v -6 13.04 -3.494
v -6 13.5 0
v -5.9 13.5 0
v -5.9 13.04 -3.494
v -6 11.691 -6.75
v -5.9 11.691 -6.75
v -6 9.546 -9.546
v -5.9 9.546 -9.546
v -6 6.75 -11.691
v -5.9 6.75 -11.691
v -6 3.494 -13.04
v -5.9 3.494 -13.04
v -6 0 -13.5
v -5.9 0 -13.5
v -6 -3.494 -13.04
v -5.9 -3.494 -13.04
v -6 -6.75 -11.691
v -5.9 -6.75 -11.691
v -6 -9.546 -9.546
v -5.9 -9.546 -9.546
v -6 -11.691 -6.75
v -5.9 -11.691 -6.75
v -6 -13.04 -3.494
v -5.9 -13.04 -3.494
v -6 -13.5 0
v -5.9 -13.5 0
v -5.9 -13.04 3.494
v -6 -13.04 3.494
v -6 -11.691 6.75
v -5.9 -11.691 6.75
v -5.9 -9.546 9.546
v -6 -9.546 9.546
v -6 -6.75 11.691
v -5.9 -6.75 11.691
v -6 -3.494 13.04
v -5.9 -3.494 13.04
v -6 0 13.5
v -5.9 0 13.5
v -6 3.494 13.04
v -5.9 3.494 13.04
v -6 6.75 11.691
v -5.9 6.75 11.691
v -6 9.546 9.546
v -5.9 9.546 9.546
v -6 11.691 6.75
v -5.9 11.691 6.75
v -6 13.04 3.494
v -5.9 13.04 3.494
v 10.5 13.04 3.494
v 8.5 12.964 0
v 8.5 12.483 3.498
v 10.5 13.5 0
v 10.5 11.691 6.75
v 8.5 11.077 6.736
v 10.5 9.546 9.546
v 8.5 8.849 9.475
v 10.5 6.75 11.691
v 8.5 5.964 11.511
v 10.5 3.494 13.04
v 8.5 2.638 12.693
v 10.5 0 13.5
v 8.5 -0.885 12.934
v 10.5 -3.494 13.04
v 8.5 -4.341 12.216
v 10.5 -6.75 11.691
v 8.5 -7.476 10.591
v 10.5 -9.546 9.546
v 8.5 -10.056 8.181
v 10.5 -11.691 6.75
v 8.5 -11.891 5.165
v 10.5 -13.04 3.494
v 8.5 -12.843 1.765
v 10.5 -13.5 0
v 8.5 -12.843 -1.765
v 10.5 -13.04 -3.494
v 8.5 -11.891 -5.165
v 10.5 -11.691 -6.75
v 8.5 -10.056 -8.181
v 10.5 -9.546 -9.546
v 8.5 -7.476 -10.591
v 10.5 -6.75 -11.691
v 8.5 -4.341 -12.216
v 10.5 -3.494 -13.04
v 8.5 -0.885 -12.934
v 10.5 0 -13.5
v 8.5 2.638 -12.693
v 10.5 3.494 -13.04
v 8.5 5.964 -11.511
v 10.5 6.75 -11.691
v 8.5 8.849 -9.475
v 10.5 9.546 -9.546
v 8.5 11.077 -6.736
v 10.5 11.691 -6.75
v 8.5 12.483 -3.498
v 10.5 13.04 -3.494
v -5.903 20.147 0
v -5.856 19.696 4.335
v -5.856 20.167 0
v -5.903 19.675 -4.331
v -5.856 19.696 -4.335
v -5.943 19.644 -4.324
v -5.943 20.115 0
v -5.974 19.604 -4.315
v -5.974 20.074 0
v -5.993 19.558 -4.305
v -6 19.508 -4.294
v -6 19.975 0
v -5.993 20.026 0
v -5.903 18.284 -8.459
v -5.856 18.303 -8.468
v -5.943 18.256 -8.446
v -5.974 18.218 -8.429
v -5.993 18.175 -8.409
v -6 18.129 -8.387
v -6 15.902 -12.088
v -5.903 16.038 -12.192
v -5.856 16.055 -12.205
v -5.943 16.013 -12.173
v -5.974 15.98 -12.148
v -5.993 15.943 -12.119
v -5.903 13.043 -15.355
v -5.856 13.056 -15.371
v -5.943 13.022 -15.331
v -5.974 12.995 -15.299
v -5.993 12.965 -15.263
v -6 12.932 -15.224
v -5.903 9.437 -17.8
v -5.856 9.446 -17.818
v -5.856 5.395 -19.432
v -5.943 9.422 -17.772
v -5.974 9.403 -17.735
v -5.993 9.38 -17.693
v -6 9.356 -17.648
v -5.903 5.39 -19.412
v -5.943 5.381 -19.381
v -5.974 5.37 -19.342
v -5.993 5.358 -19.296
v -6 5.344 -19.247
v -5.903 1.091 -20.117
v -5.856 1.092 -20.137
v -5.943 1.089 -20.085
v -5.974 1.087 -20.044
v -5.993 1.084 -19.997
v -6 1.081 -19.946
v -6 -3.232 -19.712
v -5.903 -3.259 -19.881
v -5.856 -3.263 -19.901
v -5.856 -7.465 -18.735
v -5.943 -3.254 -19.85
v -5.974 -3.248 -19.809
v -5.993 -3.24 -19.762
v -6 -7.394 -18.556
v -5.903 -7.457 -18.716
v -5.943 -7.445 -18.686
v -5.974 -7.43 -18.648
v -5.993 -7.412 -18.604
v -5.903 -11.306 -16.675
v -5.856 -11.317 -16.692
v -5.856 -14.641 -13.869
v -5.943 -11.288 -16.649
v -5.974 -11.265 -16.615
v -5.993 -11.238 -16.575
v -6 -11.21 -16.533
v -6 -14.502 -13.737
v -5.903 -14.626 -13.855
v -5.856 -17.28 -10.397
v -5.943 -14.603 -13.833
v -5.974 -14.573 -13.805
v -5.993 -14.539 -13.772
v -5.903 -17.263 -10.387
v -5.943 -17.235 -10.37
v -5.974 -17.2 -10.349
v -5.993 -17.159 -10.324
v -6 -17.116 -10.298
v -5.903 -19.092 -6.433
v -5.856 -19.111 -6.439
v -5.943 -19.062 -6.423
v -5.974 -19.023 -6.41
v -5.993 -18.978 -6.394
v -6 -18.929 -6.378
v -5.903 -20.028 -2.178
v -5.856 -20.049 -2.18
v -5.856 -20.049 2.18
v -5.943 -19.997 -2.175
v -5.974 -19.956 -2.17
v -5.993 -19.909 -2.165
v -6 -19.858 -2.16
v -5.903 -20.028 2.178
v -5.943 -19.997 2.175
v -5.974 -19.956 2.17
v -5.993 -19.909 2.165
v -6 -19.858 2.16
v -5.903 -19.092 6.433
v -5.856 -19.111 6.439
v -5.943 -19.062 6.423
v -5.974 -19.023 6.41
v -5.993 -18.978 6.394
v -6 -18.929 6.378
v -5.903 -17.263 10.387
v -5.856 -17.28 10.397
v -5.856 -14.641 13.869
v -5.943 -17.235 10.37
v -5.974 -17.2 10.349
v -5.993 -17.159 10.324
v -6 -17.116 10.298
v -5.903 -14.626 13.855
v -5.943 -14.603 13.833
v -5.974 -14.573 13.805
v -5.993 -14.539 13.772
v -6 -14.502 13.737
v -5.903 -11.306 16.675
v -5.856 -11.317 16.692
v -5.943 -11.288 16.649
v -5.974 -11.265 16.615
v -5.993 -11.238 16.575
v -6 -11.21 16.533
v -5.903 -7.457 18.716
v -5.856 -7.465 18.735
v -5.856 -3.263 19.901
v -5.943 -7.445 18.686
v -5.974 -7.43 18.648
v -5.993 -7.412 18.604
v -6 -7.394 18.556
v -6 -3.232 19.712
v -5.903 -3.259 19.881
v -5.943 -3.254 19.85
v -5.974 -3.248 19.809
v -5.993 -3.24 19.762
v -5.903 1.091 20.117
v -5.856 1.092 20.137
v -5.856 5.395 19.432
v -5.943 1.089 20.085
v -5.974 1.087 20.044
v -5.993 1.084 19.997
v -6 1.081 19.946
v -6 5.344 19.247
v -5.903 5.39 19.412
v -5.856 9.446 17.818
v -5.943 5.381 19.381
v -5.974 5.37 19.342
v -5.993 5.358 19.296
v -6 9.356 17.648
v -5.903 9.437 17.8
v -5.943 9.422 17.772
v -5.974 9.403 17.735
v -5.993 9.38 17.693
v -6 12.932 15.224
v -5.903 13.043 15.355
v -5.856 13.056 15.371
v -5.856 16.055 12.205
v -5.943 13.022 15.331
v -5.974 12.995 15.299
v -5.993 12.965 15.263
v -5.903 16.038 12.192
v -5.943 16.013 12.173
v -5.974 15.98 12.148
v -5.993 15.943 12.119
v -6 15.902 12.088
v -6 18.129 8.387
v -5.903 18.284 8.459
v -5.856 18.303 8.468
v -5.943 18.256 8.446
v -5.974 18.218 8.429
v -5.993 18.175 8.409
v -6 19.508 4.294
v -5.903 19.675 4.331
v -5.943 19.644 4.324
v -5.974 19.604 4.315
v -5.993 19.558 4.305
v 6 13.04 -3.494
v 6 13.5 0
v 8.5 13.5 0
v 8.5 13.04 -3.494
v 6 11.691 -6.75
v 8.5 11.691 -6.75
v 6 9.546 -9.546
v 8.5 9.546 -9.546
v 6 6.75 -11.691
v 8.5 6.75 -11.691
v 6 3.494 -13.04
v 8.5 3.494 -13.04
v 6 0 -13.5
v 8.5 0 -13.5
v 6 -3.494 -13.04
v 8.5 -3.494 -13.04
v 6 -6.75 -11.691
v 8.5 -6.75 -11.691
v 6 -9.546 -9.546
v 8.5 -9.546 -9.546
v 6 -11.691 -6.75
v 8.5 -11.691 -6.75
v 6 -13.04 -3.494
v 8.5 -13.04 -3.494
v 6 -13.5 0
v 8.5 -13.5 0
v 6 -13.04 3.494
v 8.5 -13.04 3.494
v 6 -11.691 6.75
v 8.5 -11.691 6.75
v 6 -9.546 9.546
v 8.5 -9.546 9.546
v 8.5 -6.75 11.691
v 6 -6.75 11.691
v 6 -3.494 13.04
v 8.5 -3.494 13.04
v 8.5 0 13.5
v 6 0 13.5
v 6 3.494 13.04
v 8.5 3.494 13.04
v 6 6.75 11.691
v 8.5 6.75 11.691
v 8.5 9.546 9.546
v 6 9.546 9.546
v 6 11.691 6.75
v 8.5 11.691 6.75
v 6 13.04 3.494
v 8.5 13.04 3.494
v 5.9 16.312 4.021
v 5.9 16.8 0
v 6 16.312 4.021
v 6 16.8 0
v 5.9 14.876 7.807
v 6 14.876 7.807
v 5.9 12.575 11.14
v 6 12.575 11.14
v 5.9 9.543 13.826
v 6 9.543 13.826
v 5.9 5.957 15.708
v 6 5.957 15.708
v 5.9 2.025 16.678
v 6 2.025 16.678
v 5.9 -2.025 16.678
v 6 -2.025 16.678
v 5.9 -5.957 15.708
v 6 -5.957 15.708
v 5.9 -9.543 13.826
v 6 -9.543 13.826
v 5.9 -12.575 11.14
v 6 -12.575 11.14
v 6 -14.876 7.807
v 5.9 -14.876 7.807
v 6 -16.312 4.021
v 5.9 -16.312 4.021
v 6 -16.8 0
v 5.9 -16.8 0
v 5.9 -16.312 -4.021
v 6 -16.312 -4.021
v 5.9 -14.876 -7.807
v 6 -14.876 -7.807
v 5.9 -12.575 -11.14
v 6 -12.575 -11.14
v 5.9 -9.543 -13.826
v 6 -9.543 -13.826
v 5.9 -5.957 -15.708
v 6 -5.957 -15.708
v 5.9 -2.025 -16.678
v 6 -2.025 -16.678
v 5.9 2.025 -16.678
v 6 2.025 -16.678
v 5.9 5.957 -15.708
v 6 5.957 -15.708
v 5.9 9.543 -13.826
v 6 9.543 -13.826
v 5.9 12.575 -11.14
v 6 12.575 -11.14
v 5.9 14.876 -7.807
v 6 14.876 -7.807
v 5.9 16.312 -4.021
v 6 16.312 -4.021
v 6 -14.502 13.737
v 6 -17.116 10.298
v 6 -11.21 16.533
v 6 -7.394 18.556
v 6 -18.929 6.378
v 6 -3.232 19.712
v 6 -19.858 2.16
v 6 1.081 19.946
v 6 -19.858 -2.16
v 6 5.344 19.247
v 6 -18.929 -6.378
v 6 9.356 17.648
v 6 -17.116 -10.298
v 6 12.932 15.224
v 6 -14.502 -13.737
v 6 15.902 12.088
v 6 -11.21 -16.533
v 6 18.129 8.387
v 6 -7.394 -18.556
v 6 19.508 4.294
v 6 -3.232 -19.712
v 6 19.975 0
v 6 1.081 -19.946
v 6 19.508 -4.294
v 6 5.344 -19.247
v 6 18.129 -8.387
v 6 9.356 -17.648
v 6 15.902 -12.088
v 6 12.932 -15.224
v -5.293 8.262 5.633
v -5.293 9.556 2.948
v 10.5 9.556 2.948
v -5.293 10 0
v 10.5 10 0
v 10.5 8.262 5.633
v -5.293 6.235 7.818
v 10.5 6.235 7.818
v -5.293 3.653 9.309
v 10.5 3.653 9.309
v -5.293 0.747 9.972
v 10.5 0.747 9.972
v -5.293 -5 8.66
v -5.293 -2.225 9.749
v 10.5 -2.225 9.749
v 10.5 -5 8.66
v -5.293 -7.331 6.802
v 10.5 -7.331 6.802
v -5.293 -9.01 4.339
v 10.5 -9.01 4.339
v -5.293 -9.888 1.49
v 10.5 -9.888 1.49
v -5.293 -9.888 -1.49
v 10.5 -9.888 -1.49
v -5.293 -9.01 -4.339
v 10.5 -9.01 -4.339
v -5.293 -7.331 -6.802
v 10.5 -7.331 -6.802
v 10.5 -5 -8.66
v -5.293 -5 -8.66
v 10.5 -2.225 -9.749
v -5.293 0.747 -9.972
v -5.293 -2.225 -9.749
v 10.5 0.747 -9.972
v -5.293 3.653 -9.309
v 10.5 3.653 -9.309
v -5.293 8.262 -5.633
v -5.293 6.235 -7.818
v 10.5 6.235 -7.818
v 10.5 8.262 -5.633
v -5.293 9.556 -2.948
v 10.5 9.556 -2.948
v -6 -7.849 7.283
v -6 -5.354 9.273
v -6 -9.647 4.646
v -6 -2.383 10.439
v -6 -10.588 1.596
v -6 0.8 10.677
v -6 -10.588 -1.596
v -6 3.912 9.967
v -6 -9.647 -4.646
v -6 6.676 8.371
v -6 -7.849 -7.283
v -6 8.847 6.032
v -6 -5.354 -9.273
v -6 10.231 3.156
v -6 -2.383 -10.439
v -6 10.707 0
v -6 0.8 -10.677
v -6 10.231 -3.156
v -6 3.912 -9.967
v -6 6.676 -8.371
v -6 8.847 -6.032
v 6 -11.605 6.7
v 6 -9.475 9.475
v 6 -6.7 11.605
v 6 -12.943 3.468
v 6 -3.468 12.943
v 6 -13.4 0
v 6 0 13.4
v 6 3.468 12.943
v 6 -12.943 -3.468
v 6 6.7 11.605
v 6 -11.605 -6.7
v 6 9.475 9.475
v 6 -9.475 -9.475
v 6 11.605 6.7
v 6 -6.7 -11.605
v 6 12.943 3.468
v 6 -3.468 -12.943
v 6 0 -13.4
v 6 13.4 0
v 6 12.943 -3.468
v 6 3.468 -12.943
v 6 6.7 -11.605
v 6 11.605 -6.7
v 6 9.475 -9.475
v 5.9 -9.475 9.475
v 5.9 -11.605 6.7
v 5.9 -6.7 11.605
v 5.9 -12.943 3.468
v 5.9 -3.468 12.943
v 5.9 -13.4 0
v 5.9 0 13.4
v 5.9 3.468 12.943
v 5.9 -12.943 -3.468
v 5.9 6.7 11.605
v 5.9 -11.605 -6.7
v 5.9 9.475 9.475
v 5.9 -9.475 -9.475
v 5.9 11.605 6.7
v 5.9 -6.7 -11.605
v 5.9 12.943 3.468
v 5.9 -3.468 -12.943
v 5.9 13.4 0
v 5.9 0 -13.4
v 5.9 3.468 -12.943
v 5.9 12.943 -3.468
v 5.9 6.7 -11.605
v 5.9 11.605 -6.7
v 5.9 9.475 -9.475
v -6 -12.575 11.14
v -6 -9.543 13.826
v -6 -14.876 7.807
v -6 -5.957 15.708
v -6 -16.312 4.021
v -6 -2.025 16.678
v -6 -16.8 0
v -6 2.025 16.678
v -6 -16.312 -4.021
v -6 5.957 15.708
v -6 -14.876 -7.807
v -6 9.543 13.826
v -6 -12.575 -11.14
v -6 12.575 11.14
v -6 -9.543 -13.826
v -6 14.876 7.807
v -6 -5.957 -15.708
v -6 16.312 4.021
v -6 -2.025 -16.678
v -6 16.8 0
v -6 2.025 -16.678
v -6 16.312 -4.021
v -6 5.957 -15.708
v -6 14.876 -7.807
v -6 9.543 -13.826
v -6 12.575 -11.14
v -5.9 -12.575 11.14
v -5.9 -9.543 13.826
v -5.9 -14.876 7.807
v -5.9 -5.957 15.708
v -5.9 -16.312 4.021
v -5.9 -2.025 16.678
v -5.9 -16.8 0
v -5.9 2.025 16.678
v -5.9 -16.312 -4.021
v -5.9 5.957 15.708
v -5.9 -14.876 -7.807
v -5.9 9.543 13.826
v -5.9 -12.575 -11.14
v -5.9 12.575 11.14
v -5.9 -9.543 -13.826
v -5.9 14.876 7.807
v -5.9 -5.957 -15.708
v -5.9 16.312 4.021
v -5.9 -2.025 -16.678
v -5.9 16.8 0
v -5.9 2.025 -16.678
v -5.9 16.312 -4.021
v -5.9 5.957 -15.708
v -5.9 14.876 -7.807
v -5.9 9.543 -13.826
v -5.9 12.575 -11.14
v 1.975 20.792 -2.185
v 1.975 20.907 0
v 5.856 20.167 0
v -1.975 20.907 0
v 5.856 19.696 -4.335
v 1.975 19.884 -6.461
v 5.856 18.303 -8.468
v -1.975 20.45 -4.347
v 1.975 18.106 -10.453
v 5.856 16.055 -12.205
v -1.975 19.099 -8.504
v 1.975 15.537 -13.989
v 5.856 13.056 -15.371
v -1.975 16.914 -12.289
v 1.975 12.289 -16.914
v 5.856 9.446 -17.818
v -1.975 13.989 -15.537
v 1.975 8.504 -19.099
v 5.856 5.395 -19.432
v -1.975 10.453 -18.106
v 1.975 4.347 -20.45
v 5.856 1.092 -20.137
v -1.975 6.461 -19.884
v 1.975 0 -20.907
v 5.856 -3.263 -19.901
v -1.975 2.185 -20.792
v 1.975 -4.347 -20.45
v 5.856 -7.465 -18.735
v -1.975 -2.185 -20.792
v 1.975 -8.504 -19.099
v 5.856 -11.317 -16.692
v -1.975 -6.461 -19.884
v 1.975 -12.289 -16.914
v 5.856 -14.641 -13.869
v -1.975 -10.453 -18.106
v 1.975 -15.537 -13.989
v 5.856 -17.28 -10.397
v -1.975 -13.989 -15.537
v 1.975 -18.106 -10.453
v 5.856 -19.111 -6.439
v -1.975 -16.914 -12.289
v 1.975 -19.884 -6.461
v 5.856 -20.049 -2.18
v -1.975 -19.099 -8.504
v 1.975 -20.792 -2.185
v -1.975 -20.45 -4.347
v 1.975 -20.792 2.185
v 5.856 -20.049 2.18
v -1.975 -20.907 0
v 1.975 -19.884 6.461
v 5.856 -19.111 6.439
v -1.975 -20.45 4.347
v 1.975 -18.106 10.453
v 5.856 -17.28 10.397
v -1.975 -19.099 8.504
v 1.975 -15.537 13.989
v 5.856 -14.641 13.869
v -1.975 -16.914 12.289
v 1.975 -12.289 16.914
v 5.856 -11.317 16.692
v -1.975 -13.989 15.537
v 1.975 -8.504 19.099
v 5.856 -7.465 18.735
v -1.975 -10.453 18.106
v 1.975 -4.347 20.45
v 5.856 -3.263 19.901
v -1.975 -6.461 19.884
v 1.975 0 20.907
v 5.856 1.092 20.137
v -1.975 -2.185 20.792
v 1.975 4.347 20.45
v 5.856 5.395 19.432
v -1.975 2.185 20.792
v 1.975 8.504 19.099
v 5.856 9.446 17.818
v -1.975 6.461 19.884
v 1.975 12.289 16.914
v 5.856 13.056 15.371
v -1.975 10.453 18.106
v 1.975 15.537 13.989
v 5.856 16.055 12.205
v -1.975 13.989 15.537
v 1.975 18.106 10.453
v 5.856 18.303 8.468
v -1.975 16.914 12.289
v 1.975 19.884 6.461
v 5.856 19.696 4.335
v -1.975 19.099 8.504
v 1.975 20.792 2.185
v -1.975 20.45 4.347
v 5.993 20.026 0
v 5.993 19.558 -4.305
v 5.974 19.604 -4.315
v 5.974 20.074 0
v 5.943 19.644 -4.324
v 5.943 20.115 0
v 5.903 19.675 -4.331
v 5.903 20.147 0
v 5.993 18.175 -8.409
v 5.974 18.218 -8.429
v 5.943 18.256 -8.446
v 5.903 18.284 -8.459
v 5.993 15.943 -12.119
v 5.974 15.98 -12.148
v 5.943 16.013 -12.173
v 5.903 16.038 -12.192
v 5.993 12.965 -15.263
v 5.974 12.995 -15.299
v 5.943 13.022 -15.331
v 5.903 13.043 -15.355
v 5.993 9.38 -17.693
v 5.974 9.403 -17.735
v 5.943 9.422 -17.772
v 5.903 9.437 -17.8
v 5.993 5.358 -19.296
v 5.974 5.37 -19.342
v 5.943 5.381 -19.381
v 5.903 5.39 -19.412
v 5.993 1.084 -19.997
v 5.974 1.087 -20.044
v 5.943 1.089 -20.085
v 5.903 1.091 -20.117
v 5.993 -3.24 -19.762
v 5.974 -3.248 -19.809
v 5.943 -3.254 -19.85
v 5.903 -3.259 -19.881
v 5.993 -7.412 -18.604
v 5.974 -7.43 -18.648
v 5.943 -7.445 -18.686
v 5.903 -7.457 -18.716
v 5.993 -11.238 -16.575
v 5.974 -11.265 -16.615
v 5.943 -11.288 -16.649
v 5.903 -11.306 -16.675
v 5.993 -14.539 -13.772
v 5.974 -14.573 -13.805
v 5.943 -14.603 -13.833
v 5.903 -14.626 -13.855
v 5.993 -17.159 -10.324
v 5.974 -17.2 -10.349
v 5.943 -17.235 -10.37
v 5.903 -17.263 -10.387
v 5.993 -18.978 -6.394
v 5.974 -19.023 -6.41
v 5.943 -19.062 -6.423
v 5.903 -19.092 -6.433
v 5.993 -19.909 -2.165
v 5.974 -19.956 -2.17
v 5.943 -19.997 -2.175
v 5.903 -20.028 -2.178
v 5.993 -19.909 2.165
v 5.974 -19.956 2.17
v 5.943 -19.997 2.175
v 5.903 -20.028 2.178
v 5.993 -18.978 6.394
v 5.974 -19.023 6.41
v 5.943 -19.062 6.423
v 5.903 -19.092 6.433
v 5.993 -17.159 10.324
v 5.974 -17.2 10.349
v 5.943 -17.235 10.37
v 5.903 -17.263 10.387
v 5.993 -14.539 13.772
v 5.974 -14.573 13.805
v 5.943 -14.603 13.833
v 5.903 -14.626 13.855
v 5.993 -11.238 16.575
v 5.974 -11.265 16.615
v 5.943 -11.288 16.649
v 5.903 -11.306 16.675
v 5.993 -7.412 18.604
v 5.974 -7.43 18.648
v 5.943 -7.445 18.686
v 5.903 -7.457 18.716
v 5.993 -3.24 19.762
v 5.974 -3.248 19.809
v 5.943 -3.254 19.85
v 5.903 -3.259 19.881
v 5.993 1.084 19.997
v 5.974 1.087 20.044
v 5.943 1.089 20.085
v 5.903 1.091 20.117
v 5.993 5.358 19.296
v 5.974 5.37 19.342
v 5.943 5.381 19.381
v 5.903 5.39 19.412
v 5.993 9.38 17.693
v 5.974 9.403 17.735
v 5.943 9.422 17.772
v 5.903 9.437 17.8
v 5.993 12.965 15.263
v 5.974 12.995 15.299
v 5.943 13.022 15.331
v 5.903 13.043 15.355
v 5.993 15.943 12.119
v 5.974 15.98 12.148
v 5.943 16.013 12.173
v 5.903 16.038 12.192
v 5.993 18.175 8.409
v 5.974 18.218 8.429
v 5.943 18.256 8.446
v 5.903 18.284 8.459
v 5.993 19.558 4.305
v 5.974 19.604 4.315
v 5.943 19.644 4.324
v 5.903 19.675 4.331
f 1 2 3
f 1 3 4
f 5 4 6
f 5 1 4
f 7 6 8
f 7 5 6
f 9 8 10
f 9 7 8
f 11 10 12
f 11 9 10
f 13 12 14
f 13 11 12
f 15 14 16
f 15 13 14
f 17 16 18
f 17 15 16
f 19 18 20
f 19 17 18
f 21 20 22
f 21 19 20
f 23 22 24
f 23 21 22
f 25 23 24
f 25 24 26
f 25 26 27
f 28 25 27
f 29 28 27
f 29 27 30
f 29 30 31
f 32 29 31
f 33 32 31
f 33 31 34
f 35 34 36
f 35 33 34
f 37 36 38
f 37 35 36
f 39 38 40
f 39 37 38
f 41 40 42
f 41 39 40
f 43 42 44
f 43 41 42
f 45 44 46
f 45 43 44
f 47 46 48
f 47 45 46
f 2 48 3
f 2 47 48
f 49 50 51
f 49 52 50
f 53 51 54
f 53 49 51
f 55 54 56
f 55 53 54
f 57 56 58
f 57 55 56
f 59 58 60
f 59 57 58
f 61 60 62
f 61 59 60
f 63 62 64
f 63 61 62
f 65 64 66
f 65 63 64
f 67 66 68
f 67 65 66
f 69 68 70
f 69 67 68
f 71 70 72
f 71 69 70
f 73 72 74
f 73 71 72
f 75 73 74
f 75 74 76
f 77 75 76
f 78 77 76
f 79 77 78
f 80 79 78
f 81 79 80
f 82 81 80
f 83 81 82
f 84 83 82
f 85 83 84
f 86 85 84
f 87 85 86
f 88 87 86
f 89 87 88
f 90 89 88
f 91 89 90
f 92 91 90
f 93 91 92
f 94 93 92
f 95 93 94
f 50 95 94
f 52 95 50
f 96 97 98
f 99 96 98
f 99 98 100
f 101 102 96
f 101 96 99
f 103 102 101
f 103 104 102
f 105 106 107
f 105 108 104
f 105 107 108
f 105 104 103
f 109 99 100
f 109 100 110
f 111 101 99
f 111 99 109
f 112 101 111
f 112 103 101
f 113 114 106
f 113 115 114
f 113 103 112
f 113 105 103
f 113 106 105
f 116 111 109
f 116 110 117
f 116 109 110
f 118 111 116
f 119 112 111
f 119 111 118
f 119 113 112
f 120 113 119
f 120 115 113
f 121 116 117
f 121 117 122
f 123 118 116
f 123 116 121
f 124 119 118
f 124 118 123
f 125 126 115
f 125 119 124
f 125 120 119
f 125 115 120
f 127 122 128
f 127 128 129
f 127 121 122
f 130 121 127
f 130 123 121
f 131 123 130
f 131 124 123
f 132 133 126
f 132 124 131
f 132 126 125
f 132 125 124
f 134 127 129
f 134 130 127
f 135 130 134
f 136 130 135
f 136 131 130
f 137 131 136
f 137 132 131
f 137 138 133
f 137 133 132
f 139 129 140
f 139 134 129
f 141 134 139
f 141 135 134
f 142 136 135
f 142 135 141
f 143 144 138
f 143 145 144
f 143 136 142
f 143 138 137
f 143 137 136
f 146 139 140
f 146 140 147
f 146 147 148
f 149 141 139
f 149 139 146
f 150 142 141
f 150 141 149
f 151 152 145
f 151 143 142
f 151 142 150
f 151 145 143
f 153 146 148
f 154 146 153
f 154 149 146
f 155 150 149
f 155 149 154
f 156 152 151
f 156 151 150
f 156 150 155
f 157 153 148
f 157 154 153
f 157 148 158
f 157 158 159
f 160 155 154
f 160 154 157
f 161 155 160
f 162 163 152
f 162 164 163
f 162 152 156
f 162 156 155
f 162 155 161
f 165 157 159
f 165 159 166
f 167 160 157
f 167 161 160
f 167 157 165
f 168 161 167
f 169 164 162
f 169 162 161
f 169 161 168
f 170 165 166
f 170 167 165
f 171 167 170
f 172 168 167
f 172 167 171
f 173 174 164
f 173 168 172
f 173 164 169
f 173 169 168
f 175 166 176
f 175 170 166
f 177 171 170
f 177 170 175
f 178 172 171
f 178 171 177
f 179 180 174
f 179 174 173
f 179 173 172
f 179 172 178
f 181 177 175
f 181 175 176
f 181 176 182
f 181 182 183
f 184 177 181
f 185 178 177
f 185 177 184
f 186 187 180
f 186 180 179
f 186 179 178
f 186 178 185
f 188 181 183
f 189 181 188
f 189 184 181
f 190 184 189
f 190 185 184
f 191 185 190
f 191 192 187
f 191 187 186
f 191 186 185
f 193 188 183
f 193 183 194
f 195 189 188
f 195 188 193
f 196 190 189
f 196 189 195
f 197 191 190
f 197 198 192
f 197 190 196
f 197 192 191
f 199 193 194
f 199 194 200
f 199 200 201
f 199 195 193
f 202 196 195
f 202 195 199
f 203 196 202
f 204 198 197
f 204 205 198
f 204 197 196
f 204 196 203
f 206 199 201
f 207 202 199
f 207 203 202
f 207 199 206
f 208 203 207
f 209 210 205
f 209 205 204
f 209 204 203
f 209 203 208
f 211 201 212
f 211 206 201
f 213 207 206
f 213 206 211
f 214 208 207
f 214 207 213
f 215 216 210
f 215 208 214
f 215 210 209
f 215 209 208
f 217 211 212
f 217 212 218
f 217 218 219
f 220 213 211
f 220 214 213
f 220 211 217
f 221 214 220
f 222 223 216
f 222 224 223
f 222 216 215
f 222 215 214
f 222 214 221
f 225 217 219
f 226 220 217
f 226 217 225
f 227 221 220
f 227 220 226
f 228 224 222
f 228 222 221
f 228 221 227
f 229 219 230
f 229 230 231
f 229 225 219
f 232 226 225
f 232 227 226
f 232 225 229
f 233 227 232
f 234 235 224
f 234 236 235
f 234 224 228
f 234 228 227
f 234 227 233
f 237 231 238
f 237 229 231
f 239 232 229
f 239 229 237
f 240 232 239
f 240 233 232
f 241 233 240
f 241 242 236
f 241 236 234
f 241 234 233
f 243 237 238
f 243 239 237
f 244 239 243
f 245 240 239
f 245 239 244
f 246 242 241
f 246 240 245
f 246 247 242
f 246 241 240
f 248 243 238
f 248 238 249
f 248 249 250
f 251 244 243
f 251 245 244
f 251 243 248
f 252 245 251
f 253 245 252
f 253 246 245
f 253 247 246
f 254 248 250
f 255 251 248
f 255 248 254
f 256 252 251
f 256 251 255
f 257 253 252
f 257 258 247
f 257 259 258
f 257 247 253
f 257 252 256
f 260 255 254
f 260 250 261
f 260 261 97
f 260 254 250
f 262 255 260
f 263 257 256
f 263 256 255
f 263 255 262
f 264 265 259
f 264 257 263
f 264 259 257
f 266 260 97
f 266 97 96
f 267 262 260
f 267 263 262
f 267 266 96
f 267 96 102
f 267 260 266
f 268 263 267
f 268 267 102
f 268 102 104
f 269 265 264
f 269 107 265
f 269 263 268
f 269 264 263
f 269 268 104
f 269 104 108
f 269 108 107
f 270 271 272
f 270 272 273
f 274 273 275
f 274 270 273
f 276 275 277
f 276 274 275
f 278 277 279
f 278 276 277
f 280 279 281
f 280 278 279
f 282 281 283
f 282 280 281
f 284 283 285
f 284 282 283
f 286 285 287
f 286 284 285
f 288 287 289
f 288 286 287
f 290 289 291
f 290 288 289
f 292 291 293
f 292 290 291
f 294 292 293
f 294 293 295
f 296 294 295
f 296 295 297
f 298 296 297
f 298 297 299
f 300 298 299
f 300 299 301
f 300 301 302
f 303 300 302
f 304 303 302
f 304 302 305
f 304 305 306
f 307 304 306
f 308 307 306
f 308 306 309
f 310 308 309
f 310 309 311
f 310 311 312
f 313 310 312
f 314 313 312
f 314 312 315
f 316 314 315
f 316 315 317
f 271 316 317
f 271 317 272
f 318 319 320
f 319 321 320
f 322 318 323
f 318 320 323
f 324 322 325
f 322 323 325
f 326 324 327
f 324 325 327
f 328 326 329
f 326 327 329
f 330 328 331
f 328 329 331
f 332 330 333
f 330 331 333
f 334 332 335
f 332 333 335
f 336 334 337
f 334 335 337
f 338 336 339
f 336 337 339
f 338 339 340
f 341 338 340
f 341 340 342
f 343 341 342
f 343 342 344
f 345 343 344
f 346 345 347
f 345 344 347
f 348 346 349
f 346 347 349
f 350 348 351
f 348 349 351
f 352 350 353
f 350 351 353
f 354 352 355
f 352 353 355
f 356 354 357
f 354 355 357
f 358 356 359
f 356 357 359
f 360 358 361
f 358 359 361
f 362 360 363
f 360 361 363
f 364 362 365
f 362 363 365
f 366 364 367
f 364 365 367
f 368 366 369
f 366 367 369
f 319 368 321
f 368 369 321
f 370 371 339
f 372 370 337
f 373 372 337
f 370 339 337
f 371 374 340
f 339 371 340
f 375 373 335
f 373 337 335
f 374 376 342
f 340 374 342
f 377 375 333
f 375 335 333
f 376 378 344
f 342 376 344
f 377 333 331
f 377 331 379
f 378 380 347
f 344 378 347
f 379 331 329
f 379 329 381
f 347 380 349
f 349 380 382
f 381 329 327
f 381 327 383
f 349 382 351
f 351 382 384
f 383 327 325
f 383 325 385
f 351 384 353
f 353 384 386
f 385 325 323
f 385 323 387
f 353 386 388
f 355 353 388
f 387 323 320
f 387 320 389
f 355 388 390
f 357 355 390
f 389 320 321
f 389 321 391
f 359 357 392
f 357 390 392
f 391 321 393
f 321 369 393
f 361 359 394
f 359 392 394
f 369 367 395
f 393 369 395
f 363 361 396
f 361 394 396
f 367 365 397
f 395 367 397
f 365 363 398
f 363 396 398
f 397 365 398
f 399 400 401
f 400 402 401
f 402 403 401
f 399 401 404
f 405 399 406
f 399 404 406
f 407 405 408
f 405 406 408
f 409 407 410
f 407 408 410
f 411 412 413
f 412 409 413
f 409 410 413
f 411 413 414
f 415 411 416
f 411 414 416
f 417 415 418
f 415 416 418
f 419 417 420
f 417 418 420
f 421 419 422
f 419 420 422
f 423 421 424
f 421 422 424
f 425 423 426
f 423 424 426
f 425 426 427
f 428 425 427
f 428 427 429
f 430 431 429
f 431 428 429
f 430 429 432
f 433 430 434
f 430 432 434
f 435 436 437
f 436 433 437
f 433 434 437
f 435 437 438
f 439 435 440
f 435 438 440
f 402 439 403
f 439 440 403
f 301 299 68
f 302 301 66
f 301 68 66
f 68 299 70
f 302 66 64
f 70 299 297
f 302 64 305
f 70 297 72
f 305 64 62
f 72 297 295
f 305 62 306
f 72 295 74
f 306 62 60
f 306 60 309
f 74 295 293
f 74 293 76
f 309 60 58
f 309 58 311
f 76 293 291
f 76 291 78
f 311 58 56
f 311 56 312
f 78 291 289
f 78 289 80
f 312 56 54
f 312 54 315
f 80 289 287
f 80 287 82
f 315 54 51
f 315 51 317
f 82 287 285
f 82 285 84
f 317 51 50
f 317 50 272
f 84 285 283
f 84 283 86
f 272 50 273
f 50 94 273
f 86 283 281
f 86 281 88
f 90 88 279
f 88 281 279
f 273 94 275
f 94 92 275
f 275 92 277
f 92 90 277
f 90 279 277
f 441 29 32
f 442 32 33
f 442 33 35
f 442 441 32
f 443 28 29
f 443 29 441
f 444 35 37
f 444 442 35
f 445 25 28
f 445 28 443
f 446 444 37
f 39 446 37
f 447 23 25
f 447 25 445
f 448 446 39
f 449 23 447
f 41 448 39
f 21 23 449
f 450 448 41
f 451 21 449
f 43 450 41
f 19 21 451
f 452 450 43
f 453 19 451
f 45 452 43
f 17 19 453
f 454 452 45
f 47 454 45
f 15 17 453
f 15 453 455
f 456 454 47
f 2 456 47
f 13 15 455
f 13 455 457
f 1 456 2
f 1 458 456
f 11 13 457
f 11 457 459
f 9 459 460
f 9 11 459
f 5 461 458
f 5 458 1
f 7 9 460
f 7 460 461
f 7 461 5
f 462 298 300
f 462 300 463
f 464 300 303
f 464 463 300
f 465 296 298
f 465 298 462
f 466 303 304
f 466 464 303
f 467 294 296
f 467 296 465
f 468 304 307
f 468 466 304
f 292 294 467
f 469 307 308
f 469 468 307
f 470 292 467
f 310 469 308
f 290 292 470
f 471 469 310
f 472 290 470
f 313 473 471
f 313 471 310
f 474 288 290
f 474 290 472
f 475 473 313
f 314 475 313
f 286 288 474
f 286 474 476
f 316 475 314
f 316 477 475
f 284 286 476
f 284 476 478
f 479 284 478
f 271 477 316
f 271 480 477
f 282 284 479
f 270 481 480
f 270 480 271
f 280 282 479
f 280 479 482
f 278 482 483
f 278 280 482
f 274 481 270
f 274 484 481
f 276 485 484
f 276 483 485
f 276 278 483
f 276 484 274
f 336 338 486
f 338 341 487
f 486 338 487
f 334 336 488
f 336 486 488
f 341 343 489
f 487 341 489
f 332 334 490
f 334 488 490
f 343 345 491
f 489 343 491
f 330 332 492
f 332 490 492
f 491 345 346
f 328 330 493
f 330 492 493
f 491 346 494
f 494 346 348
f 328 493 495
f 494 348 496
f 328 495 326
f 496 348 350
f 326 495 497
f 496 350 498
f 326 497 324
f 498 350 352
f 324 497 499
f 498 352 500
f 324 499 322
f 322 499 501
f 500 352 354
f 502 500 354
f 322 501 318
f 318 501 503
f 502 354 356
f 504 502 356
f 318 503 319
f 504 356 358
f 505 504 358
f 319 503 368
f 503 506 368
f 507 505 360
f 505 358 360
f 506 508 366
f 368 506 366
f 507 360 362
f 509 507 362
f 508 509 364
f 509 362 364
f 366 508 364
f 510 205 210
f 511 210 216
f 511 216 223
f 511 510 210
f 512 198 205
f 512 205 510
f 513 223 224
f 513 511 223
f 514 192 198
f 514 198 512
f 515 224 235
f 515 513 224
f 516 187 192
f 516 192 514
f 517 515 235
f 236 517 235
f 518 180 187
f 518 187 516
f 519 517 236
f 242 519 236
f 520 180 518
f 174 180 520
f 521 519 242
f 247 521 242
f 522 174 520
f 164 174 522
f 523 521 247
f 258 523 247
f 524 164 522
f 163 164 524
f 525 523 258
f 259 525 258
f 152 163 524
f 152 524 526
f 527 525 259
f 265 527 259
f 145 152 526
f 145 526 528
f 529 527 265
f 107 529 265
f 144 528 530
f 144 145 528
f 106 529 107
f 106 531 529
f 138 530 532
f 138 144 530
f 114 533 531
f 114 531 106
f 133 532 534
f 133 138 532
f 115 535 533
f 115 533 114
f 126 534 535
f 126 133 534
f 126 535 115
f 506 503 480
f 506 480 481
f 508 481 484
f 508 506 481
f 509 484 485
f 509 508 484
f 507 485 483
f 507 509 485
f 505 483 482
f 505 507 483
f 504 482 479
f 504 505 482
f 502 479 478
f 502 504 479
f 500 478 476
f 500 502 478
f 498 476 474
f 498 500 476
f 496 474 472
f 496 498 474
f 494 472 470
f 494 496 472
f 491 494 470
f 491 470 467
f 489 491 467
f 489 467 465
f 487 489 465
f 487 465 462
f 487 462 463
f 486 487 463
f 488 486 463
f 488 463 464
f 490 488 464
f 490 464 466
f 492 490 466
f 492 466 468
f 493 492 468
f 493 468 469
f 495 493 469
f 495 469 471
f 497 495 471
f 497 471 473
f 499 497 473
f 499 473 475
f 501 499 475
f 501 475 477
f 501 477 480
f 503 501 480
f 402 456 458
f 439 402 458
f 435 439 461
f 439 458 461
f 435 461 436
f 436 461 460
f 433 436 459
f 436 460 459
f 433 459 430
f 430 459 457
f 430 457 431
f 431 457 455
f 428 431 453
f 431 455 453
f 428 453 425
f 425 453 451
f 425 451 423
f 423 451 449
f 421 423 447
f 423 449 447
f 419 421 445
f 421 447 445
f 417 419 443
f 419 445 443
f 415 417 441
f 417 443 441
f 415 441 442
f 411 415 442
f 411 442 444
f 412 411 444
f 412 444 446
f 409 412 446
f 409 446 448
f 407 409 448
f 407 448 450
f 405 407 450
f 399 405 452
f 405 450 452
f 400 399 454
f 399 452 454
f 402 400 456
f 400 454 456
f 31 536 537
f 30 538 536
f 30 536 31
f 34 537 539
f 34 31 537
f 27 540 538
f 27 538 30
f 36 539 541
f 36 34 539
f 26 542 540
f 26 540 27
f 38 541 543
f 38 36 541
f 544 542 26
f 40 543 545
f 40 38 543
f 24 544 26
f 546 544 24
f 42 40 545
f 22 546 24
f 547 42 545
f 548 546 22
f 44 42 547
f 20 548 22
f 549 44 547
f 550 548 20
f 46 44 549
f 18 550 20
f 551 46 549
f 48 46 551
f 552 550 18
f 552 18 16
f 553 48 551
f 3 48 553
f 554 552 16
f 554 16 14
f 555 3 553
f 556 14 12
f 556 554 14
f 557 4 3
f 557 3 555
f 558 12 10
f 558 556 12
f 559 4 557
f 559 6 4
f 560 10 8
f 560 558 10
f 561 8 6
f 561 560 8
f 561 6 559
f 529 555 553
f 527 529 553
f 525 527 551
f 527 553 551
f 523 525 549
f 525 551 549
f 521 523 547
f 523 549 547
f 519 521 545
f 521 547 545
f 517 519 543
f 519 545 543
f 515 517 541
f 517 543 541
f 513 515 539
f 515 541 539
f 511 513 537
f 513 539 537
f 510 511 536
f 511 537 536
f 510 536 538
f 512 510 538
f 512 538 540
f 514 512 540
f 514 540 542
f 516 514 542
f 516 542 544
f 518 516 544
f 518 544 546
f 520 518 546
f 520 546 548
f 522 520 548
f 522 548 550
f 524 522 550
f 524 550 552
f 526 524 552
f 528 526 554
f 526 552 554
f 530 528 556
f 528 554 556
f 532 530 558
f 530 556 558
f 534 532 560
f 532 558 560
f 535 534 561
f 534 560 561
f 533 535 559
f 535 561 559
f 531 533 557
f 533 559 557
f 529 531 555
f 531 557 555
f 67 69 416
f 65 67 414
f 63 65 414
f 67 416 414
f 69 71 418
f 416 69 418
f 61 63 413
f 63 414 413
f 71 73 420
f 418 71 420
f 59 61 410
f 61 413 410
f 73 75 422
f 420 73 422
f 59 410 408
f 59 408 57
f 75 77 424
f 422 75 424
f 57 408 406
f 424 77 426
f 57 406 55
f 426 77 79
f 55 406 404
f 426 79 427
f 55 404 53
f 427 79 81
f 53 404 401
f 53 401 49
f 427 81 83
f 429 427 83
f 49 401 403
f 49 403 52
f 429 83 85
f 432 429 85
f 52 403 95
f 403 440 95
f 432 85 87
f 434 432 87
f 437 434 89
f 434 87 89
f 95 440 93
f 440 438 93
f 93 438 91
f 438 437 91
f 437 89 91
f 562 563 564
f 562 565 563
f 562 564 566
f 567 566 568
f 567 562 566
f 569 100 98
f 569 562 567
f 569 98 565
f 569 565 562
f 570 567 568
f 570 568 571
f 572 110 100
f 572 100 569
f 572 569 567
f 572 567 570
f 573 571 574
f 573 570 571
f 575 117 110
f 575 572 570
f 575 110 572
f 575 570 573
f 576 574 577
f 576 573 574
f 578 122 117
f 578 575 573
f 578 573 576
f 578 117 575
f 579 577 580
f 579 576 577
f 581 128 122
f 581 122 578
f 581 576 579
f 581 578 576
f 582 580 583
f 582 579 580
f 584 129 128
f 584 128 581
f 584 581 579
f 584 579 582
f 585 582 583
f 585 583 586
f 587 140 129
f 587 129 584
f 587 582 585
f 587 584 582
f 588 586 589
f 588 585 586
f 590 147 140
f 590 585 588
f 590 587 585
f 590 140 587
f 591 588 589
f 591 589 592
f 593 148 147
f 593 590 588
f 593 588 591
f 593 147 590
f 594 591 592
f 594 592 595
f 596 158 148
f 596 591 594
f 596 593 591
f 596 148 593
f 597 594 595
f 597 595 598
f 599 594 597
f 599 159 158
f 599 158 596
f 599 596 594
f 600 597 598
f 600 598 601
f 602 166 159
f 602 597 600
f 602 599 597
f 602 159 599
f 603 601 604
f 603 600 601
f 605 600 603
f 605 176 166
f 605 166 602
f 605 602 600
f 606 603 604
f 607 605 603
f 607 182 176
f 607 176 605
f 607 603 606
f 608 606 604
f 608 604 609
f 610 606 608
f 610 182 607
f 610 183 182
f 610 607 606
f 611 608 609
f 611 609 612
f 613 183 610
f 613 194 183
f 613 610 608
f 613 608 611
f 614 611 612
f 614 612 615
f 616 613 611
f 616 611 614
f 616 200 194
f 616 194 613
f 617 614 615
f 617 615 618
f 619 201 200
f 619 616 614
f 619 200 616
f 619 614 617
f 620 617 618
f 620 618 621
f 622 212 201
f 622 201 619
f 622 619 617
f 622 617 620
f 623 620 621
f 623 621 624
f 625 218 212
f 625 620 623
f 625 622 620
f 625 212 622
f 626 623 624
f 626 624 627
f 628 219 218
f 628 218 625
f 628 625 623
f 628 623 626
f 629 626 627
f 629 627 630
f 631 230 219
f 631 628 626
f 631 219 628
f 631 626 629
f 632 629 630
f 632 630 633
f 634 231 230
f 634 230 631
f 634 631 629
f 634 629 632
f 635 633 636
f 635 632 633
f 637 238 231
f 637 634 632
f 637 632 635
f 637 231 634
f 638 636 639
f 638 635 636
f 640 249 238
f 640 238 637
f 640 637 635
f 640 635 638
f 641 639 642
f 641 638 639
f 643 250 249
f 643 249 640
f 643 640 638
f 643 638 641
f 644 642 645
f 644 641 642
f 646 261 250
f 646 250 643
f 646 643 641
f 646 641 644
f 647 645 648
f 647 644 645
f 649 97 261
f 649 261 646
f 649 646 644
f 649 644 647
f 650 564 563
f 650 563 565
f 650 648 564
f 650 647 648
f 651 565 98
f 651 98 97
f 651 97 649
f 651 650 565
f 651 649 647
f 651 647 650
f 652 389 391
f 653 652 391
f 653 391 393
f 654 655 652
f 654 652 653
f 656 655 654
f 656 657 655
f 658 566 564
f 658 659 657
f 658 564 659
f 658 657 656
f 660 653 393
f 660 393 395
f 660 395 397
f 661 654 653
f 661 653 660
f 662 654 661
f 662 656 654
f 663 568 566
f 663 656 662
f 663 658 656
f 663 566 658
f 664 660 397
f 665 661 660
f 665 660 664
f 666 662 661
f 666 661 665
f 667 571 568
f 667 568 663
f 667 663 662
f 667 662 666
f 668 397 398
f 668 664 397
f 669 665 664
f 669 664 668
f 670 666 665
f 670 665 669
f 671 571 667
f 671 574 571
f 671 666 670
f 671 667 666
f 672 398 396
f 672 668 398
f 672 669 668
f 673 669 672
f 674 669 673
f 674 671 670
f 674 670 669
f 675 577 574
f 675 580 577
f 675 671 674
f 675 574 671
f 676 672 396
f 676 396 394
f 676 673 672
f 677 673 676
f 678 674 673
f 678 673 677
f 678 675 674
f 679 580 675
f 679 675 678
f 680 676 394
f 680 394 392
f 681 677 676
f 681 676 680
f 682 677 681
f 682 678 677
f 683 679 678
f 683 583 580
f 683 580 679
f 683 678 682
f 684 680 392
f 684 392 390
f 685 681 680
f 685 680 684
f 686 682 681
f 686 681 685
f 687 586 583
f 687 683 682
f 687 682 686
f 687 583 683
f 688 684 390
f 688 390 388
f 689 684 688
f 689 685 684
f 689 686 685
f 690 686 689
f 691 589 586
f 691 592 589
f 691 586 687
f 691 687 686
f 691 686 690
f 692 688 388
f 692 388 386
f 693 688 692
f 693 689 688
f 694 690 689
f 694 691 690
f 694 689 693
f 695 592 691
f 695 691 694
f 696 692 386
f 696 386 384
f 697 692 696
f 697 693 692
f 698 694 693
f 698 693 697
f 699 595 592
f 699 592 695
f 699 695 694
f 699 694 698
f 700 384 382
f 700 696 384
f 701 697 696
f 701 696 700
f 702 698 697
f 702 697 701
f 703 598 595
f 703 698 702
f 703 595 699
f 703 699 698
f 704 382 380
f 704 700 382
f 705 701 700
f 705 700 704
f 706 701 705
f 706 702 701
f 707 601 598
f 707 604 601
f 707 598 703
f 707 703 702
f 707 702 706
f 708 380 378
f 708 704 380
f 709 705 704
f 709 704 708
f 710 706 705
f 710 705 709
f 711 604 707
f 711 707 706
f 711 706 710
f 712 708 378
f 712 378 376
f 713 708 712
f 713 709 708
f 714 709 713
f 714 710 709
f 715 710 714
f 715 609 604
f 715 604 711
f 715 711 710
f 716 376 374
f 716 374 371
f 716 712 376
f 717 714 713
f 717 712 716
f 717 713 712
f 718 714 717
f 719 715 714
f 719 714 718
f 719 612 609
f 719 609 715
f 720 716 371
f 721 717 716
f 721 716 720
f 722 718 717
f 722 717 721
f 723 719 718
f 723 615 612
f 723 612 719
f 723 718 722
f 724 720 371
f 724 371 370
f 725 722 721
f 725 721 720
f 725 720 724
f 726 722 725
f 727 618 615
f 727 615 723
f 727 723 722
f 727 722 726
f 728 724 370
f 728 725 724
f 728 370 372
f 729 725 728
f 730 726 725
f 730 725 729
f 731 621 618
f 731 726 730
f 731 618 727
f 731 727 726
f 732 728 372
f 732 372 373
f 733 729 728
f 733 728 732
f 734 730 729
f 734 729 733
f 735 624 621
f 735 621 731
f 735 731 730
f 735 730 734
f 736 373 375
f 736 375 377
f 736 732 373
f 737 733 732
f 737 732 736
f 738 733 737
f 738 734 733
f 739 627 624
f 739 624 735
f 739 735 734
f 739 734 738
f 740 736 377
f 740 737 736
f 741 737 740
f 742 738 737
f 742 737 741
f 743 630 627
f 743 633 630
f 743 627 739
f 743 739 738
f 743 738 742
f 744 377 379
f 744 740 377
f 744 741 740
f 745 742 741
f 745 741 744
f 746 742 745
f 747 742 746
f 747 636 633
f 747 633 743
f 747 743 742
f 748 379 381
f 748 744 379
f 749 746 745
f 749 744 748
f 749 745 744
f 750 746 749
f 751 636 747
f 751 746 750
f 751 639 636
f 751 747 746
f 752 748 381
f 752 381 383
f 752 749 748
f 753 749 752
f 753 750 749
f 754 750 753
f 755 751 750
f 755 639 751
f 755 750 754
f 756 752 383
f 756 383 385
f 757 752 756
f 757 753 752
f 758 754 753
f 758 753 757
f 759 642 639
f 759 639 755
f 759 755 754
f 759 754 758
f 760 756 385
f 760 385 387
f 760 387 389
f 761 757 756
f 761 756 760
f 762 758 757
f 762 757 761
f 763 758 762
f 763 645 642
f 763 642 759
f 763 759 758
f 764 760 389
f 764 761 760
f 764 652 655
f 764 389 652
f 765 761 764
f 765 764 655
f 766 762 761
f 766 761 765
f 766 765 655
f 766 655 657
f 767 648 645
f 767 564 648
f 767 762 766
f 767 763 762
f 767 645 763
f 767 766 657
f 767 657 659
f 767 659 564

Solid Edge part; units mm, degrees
sketch "Sketch1" plane through (0, 0, 0) normal (0, 0, 1) x (1, 0, 0)
  line L0 (-6, 19.975) -> (-6, 16.8)
  line L1 (-6, 16.8) -> (-5.9, 16.8)
  line L2 (-5.9, 16.8) -> (-5.9, 13.5)
  line L3 (-5.9, 13.5) -> (-6, 13.5)
  line L4 (-6, 13.5) -> (-6, 10.7071)
  line L5 (-6, 10.7071) -> (-5.2929, 10)
  line L6 (-5.2929, 10) -> (10.5, 10)
  line L7 (10.5, 10) -> (10.5, 13.5)
  line L8 (10.5, 13.5) -> (8.5, 12.9641)
  line L9 (8.5, 12.9641) -> (8.5, 13.5)
  line L10 (8.5, 13.5) -> (6, 13.5)
  line L11 (6, 13.5) -> (6, 13.4)
  line L12 (6, 13.4) -> (5.9, 13.4)
  line L13 (5.9, 13.4) -> (5.9, 16.8)
  line L14 (5.9, 16.8) -> (6, 16.8)
  line L15 (6, 16.8) -> (6, 19.975)
  arc A0 (6, 19.975) -> (5.8558, 20.1671) centre (5.8, 19.975) ccw
  arc A1 (5.8558, 20.1671) -> (-5.8558, 20.1671) centre (0, 0) ccw
  arc A2 (-5.8558, 20.1671) -> (-6, 19.975) centre (-5.8, 19.975) ccw
revolve "RevolvedProtrusion1" add sketch "Sketch1" angle 360 about axis through (10.5, 0, 0) along (-1, 0, 0)
properties part number "62599720_2"
